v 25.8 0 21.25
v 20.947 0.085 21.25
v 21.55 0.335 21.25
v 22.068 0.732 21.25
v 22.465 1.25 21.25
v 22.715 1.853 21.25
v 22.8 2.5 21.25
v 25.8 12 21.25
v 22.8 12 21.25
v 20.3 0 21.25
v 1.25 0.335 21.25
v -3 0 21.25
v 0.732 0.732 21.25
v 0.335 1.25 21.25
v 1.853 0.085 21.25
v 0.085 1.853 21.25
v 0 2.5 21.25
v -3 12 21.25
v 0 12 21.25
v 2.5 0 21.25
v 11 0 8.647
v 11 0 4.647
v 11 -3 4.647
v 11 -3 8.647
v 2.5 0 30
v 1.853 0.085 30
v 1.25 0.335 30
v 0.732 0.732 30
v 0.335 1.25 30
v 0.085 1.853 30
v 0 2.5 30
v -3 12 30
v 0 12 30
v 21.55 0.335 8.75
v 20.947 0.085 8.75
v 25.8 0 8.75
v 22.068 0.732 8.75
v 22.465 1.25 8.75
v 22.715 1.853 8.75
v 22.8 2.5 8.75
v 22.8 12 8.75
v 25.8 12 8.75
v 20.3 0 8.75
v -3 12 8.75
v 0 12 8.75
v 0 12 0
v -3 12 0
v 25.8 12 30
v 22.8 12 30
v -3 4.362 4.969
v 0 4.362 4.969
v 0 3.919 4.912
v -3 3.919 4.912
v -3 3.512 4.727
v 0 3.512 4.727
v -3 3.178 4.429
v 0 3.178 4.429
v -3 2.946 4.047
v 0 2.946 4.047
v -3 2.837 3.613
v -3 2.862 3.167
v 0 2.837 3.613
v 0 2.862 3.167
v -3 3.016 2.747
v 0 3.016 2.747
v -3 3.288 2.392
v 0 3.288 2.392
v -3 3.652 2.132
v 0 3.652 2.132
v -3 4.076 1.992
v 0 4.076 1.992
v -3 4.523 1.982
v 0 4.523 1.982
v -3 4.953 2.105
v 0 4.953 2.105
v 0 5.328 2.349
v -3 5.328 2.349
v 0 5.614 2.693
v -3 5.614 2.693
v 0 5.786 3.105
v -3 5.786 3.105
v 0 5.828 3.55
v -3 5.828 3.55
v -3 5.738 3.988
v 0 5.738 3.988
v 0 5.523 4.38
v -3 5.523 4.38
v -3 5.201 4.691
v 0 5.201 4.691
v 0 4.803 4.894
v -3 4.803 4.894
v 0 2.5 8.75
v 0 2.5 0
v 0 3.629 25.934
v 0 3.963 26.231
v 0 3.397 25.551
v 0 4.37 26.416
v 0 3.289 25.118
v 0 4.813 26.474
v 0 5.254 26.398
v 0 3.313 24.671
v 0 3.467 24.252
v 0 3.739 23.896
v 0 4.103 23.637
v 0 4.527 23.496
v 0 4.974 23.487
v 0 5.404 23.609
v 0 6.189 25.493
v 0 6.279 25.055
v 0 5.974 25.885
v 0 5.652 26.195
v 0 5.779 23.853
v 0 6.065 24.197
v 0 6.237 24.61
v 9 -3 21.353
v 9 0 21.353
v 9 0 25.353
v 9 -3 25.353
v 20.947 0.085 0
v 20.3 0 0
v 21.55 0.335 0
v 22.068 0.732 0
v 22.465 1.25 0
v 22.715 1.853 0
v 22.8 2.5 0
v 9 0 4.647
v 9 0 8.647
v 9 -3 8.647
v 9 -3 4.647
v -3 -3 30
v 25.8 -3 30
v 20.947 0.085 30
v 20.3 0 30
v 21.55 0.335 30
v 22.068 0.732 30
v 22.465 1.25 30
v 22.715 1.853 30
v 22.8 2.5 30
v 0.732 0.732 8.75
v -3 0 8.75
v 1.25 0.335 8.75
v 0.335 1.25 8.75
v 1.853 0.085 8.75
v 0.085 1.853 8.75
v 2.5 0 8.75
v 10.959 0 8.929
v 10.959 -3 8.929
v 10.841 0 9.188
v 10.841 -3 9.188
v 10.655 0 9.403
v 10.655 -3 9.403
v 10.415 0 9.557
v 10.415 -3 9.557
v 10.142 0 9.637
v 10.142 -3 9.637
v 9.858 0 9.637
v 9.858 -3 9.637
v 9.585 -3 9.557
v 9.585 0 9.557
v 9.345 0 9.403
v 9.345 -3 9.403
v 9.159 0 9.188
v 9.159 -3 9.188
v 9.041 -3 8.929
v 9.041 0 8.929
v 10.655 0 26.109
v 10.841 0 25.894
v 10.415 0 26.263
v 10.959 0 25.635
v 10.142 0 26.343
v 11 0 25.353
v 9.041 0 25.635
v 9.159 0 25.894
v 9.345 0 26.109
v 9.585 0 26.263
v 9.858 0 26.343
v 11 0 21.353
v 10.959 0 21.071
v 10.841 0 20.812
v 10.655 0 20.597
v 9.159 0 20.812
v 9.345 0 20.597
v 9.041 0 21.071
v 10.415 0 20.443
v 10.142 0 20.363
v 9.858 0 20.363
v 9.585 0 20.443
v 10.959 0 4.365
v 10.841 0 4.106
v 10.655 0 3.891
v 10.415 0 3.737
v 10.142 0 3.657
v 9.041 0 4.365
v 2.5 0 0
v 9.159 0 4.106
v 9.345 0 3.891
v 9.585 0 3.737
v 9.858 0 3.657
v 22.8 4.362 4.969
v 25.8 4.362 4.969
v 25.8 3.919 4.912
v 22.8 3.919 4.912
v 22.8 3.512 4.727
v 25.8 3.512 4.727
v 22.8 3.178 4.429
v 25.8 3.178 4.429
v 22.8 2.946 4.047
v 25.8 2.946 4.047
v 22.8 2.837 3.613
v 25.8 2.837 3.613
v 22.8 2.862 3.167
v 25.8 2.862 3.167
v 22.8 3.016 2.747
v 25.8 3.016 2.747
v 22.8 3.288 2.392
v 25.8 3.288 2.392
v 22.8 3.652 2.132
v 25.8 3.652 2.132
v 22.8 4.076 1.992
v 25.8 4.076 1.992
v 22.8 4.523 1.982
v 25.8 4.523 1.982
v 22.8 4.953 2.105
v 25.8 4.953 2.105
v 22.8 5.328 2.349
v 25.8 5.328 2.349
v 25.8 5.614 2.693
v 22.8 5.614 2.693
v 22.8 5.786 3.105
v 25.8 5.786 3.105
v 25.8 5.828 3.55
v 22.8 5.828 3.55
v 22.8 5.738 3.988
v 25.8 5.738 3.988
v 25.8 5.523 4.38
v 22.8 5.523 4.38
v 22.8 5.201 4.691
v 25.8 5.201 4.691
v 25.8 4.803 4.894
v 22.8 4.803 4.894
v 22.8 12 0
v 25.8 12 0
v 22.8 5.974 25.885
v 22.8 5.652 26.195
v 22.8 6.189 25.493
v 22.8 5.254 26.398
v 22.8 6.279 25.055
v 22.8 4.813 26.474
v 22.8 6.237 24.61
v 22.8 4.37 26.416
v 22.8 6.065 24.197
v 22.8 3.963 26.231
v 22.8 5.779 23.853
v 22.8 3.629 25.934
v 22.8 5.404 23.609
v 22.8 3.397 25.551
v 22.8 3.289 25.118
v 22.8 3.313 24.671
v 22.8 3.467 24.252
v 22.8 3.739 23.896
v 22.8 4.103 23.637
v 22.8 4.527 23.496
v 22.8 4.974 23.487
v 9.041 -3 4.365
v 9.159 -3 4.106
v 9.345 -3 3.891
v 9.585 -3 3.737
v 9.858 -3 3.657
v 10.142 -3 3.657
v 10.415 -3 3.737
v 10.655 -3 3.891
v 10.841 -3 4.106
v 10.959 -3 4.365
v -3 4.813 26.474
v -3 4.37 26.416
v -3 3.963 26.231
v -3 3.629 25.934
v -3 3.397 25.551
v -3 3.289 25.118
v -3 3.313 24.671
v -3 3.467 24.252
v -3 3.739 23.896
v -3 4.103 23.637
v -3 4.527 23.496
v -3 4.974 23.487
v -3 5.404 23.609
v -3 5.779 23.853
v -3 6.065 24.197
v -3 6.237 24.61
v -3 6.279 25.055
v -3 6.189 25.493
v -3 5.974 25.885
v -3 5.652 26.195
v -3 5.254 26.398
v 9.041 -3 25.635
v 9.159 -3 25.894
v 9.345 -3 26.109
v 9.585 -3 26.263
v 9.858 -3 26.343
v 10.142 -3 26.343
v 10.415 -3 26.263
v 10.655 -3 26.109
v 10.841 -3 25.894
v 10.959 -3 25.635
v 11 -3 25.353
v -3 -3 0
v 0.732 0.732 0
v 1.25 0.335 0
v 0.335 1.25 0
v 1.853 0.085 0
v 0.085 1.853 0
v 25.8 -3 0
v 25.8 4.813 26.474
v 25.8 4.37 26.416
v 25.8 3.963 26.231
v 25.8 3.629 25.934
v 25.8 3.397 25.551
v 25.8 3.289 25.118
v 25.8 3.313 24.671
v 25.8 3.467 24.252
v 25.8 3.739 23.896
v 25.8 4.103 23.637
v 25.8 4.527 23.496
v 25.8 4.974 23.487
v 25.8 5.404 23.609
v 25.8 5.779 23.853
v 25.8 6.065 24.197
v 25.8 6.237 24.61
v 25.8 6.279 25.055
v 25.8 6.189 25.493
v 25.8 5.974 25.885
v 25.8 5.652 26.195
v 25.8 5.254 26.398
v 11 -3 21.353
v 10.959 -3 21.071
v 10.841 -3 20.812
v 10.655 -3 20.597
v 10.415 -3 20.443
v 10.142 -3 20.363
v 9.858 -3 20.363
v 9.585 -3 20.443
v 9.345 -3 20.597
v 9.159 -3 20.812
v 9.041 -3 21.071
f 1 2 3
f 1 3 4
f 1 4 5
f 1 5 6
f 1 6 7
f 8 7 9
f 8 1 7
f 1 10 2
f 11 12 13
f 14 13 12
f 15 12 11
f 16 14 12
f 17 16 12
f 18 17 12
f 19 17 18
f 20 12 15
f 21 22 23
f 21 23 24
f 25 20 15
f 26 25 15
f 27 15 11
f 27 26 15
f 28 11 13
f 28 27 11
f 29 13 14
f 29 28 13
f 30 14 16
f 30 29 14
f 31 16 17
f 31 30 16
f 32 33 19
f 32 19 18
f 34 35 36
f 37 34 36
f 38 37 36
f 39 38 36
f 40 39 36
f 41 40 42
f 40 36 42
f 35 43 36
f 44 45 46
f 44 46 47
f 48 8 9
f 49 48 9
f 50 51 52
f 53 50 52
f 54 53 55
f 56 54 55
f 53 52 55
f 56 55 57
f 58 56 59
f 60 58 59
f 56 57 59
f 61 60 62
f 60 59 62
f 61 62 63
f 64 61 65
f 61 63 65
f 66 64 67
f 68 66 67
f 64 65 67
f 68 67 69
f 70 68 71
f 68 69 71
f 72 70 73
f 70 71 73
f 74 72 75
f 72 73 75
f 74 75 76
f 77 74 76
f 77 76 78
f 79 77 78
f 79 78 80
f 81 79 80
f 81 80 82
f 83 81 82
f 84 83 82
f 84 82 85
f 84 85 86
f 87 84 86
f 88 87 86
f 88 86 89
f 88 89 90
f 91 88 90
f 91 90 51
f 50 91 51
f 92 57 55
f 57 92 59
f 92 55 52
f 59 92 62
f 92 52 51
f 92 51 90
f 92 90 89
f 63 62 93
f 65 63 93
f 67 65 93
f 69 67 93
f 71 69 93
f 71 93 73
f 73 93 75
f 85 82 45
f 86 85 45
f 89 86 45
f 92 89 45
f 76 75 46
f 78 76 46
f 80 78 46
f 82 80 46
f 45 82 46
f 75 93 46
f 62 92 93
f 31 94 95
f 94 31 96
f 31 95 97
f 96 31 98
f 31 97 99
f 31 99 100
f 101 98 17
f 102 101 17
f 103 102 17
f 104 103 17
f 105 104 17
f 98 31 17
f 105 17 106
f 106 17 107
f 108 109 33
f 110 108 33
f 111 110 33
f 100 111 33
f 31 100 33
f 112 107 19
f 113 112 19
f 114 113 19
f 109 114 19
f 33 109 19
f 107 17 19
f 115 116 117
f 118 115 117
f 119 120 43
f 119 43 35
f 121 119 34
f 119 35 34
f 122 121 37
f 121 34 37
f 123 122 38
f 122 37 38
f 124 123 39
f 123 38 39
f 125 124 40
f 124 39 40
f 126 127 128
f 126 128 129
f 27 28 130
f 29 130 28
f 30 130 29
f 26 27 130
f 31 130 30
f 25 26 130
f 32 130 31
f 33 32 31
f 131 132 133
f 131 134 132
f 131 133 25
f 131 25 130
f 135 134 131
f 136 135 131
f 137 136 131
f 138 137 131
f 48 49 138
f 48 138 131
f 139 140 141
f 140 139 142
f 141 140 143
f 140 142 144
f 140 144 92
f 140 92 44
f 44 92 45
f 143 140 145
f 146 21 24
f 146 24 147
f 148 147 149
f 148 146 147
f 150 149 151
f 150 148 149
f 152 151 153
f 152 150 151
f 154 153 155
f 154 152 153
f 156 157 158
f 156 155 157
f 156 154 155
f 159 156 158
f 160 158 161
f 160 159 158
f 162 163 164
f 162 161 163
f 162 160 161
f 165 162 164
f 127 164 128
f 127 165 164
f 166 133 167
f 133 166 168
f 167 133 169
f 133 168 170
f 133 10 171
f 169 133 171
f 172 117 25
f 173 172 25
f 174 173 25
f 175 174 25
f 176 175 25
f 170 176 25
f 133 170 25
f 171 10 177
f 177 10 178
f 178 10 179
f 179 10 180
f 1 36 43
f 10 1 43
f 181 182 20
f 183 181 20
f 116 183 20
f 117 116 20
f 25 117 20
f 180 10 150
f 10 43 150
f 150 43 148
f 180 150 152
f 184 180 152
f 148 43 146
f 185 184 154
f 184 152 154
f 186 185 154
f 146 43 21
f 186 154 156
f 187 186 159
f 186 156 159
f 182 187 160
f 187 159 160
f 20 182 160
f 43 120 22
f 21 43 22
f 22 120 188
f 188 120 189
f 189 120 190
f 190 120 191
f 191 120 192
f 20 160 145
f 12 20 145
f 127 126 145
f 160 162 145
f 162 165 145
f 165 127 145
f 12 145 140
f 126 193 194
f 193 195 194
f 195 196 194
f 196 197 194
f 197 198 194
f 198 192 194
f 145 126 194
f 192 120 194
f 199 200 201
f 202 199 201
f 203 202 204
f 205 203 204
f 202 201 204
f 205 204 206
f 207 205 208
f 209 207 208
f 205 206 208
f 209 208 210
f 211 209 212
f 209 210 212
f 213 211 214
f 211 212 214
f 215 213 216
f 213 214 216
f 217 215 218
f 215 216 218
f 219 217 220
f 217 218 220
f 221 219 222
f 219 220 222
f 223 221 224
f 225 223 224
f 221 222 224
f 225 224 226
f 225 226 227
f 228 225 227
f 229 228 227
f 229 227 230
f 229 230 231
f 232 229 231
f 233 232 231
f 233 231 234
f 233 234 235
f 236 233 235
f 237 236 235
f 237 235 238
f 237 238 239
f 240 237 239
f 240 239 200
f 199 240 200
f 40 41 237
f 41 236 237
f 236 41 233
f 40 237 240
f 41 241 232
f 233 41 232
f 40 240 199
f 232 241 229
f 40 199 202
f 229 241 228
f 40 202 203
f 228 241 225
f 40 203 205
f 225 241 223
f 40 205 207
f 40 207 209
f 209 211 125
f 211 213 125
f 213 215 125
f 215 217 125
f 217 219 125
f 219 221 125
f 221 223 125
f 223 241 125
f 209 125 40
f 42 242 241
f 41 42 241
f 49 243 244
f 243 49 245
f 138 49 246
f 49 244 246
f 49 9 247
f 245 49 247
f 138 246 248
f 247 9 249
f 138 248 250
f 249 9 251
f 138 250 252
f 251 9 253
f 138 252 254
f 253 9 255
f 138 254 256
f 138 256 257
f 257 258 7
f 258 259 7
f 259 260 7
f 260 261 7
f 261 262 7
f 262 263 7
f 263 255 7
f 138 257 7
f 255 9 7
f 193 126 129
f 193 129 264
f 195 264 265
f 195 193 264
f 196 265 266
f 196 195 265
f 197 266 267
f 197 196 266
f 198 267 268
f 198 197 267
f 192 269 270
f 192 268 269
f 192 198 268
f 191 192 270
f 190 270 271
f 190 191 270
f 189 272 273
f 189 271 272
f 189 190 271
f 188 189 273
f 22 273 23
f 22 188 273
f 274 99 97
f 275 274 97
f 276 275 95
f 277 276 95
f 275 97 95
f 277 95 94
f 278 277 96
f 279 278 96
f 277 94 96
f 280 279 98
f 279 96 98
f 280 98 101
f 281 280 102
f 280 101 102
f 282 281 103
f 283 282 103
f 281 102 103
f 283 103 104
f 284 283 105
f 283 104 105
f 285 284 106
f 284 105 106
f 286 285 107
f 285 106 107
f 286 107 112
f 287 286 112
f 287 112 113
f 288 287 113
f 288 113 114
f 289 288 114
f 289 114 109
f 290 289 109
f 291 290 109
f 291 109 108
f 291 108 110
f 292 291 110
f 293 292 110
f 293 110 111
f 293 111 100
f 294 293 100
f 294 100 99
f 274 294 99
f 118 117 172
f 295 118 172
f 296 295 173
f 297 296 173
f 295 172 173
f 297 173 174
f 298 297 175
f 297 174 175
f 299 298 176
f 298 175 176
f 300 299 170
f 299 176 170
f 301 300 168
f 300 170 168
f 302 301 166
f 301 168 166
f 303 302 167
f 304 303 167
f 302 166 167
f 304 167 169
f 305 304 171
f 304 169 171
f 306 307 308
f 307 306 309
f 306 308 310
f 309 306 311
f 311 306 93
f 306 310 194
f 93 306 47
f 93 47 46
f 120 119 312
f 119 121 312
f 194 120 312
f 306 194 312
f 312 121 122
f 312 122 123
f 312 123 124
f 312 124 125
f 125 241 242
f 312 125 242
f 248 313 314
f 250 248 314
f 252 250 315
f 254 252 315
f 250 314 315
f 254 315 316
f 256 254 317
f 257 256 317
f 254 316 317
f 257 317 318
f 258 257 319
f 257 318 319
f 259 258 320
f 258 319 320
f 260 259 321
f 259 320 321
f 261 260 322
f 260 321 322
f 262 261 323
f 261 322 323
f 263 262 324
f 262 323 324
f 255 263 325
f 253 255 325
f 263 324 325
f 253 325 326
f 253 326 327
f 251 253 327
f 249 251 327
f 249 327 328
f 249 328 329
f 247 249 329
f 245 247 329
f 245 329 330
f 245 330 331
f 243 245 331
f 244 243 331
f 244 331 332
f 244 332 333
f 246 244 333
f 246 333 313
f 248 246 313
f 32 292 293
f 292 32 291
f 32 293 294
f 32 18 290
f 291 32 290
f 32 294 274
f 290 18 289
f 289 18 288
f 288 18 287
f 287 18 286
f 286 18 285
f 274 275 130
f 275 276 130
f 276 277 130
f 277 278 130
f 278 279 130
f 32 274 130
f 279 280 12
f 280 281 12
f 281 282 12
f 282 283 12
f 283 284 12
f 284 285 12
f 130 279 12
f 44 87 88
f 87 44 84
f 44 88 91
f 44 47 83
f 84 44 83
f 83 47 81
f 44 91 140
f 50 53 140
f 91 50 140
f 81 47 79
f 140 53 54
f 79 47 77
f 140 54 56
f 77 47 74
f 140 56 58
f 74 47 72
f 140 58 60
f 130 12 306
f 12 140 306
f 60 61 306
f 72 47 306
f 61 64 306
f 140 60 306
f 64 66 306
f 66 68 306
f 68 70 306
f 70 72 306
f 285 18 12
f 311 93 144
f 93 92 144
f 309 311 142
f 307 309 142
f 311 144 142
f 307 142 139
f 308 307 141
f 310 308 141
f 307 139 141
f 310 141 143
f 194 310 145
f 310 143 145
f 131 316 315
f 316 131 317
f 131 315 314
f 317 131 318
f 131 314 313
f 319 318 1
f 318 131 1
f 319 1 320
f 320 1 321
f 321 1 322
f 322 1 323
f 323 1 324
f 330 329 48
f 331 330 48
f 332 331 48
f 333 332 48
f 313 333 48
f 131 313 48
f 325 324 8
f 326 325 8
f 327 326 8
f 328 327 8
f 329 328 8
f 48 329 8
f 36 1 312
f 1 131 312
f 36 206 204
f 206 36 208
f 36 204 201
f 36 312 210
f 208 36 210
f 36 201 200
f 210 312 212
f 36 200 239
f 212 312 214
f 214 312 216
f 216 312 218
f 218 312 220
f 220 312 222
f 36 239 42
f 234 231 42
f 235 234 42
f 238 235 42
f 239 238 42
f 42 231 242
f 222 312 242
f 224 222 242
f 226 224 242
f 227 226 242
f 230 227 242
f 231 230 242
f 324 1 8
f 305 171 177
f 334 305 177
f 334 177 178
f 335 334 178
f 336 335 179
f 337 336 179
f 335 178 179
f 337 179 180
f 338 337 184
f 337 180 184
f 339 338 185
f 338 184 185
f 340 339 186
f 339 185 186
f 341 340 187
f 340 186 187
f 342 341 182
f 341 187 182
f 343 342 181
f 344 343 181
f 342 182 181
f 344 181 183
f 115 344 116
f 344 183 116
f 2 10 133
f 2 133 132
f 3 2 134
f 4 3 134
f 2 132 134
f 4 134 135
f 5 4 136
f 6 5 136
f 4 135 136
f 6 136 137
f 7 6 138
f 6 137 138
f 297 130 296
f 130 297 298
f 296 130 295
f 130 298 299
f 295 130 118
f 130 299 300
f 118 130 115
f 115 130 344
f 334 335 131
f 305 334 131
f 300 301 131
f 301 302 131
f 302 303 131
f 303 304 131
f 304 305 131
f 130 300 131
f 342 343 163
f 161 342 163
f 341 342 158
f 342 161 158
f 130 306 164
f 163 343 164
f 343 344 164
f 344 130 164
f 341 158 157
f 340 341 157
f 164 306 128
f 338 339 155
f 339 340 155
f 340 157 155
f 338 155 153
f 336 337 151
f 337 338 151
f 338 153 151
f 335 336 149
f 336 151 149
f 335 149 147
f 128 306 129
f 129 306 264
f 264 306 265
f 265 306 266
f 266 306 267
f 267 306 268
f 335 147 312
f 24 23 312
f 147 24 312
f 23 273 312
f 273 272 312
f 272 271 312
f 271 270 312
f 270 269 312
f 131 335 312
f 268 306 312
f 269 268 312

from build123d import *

# Parameters (mm, degrees)
EXTRUDE_1_DEPTH     = 30
SKETCH_2_W          = 12.5
SKETCH_2_H          = 12
CUT_EXTRUDE_1_DEPTH = 28.8
CUT_EXTRUDE_2_REACH = 5
MM_PRESS_1_D        = 3
FILLET_1_R          = 2.5


with BuildPart() as part:
    # 草图1 → 凸台-拉伸1 (new body)
    with BuildSketch(Plane.XY):
        Polygon((0, 0), (0, 12), (-3, 12), (-3, -3), (25.8, -3), (25.8, 12), (22.8, 12), (22.8, 0), align=None)
    extrude(amount=EXTRUDE_1_DEPTH)

    # 草图2 → 切除-拉伸1 (cut)
    with BuildSketch(Plane(origin=(25.8, 0, 0), x_dir=(0, 0, -1), z_dir=(1, 0, 0))):
        with Locations((-15, 6)):
            Rectangle(SKETCH_2_W, SKETCH_2_H)
    extrude(amount=-CUT_EXTRUDE_1_DEPTH, mode=Mode.SUBTRACT)

    # 草图3 → 切除-拉伸2 (cut, up to next)
    with BuildSketch(Plane(origin=(0, 0, 0), x_dir=(1, 0, 0), z_dir=(0, 1, 0)), mode=Mode.PRIVATE) as cut_extrude_2_sk1:
        with BuildLine():
            Line((11, -4.647050091), (11, -8.647050091))
            ThreePointArc((11, -8.647050091), (10, -9.647050091), (9, -8.647050091))
            Line((9, -8.647050091), (9, -4.647050091))
            ThreePointArc((9, -4.647050091), (10, -3.647050091), (11, -4.647050091))
        make_face()
    cut_extrude_2_tool1 = extrude(cut_extrude_2_sk1.sketch, amount=-CUT_EXTRUDE_2_REACH, mode=Mode.PRIVATE) & part.part
    add(cut_extrude_2_tool1.solids().sort_by_distance((10, 0, 6.64705))[0], mode=Mode.SUBTRACT)
    # 草图3 → 切除-拉伸2 (cut, up to next)
    with BuildSketch(Plane(origin=(0, 0, 0), x_dir=(1, 0, 0), z_dir=(0, 1, 0)), mode=Mode.PRIVATE) as cut_extrude_2_sk2:
        with BuildLine():
            Line((11, -25.352949909), (11, -21.352949909))
            ThreePointArc((11, -21.352949909), (10, -20.352949909), (9, -21.352949909))
            Line((9, -21.352949909), (9, -25.352949909))
            ThreePointArc((9, -25.352949909), (10, -26.352949909), (11, -25.352949909))
        make_face()
    cut_extrude_2_tool2 = extrude(cut_extrude_2_sk2.sketch, amount=-CUT_EXTRUDE_2_REACH, mode=Mode.PRIVATE) & part.part
    add(cut_extrude_2_tool2.solids().sort_by_distance((10, 0, 23.35295))[0], mode=Mode.SUBTRACT)

    # 大小mm Press 暗销孔1 (through all)
    with Locations(Plane(origin=(-3, 140.185527162, 21.233815274), x_dir=(0, -0.020968354, -0.99978014), z_dir=(-1, 0, 0))):
        with Locations((20.608818994, 135.452556109), (-0.900285243, 135.452556109)):
            Hole(MM_PRESS_1_D / 2)

    # 圆角1
    fillet_1_edges = [part.edges().sort_by_distance(p)[0] for p in [
        (22.8, 0, 25.625),
        (0, 0, 25.625),
        (22.8, 0, 4.375),
        (0, 0, 4.375),
    ]]
    fillet(fillet_1_edges, radius=FILLET_1_R)


solid = part.part
